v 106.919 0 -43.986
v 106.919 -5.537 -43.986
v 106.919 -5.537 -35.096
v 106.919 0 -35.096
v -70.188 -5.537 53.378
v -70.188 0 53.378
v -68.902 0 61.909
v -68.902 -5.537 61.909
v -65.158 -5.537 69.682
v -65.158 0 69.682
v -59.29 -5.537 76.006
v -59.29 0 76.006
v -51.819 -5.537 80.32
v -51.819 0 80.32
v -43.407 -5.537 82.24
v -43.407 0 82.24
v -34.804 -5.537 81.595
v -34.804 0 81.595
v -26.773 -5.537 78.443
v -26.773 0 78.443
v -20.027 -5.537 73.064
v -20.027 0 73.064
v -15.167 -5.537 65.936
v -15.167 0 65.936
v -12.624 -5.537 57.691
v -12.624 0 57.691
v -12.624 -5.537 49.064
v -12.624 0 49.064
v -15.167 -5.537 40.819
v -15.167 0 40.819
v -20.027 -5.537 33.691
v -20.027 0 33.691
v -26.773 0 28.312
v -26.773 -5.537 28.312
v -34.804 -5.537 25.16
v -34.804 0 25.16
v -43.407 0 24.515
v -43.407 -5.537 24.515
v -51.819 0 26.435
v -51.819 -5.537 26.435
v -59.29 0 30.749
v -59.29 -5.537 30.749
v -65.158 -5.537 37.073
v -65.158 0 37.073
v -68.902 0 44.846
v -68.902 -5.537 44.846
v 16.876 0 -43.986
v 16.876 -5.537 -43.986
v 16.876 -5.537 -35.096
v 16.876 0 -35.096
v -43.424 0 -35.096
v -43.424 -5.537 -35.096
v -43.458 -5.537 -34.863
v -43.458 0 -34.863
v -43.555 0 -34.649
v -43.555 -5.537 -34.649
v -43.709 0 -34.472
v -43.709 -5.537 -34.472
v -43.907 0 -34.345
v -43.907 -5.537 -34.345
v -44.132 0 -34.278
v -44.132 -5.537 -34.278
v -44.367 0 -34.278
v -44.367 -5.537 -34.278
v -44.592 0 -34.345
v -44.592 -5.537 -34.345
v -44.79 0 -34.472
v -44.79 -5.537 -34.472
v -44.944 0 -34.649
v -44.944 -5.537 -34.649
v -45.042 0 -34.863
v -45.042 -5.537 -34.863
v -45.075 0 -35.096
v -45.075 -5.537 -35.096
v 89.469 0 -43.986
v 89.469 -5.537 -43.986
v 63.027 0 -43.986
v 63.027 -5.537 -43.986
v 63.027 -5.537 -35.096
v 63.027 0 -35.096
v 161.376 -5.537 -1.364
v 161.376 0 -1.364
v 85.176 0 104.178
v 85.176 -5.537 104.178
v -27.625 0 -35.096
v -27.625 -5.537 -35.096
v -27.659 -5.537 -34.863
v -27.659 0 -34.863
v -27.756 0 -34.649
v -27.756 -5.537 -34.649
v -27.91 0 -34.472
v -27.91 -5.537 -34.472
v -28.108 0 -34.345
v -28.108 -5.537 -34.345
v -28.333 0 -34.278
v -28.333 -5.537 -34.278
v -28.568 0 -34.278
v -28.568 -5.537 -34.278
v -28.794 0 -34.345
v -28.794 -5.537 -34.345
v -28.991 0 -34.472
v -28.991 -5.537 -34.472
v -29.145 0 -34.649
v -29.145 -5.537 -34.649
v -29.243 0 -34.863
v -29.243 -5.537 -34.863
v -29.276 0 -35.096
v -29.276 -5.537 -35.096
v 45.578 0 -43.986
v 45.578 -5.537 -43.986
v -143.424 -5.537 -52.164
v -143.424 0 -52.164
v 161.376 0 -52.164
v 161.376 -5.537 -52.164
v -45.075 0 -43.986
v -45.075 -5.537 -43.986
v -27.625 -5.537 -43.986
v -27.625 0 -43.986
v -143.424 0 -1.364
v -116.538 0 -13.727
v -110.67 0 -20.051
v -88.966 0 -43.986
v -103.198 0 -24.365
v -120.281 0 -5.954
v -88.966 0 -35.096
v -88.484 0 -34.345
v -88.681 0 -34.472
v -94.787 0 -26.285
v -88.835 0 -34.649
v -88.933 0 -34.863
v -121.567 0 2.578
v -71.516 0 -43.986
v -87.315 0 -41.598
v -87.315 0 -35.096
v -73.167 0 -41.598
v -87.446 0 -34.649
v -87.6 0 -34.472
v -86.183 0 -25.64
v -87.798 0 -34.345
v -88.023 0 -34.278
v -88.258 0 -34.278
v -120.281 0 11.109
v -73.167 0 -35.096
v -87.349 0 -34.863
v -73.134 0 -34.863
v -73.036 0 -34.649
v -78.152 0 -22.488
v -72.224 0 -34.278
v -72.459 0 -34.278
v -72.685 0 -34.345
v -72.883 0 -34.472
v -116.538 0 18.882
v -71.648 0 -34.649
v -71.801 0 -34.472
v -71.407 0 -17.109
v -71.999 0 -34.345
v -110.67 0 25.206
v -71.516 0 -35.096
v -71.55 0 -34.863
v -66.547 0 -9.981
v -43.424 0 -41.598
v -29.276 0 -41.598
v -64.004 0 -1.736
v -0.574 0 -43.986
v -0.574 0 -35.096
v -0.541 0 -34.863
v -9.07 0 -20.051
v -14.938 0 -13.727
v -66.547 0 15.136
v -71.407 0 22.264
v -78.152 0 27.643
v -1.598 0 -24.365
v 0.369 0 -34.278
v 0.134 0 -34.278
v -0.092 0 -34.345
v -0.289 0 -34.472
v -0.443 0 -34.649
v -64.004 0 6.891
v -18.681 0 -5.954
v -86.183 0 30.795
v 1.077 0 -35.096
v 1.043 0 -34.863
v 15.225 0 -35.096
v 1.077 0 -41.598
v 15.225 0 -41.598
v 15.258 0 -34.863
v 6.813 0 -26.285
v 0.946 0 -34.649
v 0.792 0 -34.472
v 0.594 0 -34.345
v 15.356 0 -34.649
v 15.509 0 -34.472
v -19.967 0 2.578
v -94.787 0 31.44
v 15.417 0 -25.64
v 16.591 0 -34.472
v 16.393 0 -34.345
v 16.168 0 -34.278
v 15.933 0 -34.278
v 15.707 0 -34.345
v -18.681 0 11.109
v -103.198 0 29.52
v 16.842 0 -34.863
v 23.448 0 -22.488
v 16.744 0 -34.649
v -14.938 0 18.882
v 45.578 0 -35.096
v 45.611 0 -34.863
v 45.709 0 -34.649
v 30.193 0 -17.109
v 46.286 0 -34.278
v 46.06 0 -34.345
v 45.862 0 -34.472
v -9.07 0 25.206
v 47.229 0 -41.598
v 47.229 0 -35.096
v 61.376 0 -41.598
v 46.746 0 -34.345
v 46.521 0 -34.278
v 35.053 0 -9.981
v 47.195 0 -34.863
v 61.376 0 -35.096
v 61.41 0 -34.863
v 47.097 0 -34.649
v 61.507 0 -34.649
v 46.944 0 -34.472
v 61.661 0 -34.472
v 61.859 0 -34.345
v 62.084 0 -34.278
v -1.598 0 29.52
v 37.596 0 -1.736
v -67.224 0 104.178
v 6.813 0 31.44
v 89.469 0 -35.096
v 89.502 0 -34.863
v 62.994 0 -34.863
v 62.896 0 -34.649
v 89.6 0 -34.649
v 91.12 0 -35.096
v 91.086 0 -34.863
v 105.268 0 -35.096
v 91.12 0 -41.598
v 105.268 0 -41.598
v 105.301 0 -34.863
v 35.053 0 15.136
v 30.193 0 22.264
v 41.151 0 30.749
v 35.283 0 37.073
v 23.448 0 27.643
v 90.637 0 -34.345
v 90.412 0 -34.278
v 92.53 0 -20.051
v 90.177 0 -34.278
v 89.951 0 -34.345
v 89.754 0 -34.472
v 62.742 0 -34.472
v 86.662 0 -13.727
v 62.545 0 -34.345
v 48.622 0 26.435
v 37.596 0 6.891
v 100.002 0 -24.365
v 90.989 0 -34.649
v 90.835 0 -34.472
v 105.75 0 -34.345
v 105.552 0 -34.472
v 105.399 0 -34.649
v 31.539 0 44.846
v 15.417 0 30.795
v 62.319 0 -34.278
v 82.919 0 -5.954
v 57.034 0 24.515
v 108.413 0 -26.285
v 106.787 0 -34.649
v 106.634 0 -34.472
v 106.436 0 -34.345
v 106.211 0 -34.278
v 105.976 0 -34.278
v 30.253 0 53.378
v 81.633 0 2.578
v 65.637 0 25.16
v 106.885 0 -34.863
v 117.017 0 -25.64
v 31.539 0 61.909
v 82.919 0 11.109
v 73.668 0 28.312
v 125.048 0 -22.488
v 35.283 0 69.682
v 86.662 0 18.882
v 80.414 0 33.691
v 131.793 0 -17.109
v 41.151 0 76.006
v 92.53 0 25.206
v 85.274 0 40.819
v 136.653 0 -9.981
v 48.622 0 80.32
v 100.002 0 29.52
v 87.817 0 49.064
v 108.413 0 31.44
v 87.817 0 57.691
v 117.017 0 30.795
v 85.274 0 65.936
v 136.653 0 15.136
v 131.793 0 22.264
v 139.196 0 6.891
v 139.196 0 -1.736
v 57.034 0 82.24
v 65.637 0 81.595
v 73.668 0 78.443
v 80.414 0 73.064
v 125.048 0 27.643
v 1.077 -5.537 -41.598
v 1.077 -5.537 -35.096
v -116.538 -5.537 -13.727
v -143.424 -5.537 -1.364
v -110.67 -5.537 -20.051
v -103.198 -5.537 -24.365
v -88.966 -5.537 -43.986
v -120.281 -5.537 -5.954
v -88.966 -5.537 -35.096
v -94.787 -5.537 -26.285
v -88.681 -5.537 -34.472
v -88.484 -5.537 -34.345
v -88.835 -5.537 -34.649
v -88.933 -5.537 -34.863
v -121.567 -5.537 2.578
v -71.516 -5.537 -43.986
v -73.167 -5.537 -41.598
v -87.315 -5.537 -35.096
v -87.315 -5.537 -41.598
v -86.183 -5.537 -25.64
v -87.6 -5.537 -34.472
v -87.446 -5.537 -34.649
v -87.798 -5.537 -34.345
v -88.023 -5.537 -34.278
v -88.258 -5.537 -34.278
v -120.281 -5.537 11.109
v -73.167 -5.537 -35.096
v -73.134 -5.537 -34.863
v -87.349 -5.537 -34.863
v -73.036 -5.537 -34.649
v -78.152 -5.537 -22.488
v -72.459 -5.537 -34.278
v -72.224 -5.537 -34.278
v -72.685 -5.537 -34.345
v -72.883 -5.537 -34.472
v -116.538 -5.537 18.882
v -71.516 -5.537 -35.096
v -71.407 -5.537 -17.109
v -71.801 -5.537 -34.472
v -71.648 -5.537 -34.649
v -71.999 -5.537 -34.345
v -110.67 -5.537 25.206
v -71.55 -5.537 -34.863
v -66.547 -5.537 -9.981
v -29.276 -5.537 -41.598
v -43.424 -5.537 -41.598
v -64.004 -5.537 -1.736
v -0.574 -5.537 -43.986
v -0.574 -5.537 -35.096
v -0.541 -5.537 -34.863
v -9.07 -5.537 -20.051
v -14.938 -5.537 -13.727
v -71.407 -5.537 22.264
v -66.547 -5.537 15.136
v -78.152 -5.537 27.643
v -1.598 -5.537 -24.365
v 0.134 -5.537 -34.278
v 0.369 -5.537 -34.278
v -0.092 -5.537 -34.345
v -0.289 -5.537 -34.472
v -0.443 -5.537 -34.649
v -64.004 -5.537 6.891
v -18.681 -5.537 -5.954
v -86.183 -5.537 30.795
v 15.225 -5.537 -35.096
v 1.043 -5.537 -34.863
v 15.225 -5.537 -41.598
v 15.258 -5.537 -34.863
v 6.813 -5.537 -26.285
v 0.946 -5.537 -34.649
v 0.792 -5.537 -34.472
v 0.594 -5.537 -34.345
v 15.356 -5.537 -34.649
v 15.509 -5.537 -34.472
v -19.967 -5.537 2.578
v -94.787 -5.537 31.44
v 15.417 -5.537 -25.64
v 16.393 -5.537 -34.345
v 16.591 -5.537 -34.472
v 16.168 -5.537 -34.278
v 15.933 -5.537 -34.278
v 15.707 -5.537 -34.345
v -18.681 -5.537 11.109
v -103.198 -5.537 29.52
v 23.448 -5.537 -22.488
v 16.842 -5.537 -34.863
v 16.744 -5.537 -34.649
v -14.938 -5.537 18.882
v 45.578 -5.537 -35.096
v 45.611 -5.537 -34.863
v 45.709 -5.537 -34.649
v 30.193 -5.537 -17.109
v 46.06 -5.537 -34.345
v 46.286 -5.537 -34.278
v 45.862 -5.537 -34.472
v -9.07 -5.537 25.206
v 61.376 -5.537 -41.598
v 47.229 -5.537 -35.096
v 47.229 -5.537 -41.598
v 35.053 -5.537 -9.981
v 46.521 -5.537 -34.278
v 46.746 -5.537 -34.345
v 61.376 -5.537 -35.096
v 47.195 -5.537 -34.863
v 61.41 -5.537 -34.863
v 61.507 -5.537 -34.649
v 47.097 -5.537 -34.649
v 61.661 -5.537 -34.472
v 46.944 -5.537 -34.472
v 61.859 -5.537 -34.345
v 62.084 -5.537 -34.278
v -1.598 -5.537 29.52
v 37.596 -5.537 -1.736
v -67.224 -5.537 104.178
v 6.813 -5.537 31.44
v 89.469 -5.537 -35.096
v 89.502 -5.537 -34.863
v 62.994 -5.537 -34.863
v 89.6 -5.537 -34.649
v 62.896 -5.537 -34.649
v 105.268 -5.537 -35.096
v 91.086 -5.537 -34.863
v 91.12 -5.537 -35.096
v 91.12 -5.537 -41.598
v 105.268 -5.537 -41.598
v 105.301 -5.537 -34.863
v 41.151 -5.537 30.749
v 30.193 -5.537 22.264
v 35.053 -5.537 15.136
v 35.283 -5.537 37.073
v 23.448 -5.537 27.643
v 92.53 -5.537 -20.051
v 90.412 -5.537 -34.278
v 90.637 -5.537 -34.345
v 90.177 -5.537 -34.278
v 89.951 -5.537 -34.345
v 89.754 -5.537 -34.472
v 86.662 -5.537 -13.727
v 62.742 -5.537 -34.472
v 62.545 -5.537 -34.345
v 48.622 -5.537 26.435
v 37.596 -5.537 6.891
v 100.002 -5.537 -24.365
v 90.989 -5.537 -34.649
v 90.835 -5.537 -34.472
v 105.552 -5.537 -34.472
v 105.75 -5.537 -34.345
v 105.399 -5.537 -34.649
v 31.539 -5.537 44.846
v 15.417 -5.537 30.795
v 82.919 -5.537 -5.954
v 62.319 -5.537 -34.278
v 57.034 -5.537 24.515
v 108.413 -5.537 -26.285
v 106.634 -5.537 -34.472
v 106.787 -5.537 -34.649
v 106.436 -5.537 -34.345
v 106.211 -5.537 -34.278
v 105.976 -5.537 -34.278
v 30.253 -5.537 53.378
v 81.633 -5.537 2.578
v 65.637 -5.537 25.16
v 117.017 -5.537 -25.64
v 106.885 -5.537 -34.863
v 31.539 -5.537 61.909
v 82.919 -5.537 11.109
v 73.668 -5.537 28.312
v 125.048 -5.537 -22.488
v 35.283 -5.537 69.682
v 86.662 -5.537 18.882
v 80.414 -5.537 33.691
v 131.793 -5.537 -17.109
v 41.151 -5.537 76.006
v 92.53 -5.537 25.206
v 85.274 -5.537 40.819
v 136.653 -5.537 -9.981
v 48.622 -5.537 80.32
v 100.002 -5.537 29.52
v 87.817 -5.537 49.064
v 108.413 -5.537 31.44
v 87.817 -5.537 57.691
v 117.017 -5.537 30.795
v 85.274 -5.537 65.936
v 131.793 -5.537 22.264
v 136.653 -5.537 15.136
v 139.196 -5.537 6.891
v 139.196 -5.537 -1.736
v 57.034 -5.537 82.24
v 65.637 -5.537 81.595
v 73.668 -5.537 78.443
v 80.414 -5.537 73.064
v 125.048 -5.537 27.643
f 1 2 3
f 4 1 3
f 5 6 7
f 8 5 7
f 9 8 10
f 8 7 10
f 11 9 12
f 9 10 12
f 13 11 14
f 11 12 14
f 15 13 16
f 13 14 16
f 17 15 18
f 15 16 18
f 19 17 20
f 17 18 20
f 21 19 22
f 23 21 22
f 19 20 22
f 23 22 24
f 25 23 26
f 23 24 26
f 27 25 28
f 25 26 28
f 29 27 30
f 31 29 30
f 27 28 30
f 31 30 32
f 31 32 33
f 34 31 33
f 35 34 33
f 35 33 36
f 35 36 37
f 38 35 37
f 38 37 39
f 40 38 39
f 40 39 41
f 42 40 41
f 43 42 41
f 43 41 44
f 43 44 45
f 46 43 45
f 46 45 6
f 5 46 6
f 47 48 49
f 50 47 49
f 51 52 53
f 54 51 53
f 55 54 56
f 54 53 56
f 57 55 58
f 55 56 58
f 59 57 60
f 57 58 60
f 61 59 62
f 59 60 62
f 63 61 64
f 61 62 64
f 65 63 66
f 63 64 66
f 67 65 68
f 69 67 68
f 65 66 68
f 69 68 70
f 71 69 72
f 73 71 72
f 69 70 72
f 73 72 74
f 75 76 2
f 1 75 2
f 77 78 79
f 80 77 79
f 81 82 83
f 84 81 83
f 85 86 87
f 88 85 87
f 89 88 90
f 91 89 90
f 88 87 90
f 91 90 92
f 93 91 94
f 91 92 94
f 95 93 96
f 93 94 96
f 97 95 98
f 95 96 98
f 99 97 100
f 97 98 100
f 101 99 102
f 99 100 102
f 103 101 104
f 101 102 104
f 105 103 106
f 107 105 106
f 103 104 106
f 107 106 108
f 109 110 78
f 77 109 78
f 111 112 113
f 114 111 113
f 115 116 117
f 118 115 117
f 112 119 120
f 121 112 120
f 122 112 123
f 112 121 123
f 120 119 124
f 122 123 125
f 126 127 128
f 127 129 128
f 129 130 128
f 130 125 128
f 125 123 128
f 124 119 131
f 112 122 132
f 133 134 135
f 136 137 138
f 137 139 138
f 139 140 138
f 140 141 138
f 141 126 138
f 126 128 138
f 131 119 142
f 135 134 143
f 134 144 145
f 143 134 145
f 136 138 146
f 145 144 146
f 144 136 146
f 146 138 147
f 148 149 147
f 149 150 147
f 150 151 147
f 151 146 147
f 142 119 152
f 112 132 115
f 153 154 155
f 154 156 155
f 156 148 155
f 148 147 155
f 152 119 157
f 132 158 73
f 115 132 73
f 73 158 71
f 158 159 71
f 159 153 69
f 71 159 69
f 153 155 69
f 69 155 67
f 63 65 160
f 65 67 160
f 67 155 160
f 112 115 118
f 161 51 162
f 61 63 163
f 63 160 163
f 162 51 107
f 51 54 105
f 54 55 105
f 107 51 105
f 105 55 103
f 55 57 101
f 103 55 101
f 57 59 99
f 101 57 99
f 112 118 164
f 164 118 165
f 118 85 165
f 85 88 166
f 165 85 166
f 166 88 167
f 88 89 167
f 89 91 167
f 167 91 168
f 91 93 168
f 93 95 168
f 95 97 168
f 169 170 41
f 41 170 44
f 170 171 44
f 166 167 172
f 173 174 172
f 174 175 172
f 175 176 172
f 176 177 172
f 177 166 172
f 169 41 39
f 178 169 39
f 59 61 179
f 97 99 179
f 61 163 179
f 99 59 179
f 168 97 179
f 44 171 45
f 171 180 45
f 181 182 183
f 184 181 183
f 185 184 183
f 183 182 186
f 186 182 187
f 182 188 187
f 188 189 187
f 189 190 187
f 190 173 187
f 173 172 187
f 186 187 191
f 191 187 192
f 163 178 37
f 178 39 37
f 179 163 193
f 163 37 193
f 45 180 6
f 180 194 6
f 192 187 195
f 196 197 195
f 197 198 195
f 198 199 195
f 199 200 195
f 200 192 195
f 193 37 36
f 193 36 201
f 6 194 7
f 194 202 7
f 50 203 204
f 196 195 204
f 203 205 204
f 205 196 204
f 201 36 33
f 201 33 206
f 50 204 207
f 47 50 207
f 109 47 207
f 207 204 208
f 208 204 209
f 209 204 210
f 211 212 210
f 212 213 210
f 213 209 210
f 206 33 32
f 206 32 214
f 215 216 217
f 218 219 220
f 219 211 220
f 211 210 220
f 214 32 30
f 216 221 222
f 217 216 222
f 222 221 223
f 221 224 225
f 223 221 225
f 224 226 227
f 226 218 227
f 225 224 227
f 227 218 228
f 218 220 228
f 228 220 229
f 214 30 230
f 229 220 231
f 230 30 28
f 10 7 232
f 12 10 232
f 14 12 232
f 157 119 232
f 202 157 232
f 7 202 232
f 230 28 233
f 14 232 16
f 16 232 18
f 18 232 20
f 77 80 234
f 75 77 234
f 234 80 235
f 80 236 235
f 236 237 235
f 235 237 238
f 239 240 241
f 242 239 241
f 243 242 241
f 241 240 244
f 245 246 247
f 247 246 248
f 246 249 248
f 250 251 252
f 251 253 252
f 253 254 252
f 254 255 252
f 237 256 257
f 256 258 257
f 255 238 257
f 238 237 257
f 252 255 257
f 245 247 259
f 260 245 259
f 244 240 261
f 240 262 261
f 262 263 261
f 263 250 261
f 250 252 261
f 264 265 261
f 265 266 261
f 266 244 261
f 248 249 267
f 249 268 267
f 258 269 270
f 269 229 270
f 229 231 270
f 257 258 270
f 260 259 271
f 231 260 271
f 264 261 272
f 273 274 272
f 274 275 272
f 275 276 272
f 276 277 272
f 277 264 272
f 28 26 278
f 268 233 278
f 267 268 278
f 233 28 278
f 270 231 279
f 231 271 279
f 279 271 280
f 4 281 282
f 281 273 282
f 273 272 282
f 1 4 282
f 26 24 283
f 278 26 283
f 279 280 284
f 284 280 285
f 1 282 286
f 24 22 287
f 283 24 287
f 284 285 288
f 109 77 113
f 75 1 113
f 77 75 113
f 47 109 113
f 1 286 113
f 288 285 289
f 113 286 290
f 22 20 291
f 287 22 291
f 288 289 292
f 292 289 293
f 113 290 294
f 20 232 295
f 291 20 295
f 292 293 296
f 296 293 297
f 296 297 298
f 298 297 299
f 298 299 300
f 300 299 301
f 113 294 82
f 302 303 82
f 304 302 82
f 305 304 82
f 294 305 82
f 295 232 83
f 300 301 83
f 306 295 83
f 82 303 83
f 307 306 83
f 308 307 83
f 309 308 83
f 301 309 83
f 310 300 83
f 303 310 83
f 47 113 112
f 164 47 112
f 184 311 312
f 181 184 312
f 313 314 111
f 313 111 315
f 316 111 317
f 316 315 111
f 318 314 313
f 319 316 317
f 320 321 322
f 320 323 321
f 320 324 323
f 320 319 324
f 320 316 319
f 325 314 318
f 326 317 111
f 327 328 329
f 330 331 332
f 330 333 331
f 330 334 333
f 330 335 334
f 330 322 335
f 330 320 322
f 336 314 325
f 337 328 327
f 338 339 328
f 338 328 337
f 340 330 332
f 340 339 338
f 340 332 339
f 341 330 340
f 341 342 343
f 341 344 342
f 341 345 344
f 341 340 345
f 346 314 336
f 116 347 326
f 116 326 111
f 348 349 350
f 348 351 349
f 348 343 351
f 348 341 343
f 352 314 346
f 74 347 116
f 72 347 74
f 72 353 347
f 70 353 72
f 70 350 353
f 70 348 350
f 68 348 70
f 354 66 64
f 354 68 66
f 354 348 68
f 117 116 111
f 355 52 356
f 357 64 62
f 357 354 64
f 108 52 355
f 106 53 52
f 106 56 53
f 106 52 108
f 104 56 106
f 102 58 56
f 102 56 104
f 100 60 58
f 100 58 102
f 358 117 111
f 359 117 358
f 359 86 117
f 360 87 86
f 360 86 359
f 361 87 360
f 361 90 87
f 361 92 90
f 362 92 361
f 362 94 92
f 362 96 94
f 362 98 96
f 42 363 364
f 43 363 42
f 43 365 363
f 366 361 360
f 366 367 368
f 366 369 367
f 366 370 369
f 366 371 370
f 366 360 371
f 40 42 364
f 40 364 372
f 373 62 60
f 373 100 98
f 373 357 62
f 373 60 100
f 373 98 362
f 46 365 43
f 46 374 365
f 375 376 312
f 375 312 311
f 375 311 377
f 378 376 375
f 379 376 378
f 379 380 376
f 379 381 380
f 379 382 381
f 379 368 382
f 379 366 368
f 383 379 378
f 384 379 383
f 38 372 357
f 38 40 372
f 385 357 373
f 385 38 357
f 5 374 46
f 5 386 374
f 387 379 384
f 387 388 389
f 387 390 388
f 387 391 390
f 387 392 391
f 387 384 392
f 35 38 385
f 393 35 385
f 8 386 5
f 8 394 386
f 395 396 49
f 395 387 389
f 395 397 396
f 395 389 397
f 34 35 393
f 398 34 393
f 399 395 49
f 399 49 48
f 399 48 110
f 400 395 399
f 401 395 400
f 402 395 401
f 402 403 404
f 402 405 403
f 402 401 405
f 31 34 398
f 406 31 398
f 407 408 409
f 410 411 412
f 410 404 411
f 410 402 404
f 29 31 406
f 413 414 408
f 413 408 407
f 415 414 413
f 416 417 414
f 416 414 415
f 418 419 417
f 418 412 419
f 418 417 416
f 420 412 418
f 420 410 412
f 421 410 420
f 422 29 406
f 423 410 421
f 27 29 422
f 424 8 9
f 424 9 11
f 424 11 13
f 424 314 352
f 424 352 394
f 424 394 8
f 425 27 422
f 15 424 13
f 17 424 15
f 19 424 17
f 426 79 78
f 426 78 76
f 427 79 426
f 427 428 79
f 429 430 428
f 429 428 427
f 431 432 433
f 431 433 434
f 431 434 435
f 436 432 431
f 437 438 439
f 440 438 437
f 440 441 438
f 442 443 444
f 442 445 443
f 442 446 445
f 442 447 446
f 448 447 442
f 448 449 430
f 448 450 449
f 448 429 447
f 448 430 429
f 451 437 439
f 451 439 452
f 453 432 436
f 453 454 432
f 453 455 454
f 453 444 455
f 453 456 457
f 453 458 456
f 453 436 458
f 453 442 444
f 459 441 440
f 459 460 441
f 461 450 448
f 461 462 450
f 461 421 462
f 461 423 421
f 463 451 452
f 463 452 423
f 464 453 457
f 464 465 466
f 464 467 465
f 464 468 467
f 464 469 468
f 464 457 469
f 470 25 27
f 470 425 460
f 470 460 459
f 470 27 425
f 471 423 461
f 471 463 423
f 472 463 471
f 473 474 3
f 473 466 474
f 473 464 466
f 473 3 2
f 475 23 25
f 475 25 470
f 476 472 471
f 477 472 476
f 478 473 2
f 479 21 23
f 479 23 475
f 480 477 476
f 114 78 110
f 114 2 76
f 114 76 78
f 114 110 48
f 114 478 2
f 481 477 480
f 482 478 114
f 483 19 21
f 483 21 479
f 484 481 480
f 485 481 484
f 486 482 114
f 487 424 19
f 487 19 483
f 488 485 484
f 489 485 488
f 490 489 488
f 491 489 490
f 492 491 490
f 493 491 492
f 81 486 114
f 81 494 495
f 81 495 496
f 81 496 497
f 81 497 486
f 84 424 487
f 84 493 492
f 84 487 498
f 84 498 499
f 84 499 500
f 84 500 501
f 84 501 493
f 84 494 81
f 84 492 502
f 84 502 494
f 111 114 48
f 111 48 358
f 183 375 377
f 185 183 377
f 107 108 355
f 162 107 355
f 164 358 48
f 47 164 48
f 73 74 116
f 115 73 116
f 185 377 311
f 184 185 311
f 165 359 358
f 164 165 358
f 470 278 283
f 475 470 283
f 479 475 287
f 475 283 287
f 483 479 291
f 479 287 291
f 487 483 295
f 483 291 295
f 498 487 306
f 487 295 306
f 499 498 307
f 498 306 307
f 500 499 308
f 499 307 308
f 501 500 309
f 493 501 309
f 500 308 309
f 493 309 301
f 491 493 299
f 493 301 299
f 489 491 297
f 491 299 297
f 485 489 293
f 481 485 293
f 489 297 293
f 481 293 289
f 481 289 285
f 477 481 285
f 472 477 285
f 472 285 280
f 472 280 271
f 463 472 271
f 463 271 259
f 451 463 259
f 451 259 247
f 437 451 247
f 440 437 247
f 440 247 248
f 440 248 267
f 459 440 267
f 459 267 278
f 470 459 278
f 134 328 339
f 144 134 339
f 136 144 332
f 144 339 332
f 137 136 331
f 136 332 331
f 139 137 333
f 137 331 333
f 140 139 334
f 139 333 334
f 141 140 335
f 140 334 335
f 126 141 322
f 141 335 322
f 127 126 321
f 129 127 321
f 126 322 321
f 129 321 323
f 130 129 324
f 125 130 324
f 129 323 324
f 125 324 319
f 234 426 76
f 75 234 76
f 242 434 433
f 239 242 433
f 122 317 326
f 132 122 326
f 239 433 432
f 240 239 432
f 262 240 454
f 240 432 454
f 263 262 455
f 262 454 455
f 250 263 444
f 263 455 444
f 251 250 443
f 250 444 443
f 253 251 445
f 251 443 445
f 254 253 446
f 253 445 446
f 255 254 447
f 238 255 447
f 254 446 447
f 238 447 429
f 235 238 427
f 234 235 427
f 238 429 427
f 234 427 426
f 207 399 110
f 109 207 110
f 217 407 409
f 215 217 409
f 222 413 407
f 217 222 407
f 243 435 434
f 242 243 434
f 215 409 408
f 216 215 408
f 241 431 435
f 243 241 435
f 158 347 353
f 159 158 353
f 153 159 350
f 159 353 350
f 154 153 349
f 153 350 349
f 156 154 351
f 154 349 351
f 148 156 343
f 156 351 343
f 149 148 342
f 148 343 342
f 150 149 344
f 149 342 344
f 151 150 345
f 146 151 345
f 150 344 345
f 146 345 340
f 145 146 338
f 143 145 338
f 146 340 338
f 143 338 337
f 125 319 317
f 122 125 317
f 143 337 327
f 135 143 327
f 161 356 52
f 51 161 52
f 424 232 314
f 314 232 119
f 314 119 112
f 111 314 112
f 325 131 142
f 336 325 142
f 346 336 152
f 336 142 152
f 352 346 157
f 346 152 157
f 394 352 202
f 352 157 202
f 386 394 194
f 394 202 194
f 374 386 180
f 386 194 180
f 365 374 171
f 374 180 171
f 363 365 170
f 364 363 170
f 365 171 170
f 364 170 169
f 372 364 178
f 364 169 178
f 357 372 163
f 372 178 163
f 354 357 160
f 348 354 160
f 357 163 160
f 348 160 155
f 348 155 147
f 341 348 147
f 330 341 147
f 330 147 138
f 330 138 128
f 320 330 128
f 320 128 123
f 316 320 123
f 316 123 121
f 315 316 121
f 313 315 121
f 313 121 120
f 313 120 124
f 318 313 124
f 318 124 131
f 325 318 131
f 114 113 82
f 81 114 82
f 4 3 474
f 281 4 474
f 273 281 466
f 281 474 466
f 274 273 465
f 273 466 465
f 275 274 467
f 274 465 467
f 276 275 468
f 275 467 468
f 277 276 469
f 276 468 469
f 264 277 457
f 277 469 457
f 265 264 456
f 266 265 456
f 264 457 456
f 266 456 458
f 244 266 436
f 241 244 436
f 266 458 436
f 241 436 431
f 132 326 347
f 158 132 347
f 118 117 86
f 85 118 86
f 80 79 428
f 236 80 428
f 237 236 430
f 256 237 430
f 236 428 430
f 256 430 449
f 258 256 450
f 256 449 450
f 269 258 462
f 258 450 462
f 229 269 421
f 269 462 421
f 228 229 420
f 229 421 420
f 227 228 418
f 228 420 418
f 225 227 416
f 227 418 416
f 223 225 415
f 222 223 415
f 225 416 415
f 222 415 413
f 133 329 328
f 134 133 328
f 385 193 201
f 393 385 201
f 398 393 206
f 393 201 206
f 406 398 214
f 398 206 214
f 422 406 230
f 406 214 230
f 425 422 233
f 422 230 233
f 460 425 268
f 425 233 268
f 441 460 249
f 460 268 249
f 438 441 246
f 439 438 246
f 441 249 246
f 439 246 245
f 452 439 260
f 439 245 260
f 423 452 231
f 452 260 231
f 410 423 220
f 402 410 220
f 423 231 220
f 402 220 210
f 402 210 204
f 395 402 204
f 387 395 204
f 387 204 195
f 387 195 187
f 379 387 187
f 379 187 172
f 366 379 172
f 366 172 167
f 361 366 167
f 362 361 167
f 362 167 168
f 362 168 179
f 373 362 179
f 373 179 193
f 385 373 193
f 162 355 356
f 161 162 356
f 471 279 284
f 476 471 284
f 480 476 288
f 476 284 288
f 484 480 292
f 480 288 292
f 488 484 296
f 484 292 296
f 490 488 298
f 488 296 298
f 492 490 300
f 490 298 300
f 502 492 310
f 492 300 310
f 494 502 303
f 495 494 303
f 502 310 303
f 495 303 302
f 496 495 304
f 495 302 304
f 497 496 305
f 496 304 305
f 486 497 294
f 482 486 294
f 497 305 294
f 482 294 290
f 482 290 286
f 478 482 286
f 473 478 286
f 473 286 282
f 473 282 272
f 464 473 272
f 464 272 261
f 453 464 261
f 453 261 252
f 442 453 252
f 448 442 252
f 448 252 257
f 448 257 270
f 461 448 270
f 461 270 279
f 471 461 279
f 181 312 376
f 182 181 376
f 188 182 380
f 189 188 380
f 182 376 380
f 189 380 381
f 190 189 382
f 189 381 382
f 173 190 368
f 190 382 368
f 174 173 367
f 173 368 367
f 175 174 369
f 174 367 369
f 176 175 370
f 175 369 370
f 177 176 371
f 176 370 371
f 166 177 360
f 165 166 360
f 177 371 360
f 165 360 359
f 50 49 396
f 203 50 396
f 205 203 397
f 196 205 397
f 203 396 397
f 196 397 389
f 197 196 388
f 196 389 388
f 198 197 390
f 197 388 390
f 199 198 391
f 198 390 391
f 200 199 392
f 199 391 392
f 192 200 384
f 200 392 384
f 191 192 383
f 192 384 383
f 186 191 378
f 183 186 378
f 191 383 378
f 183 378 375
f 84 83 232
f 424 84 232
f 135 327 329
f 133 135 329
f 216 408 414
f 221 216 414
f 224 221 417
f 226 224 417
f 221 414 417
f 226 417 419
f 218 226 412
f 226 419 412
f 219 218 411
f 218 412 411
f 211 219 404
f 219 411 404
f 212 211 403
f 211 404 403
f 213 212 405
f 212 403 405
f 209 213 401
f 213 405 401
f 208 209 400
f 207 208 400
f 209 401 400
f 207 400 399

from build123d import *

# Parameters (mm, degrees)
F1_DEPTH  = 5.5372
F3_D      = 57.8866
F5_DEPTH  = 5.5382
F7_DEPTH  = 17.76331
F9_DEPTH  = 25.4
F11_DEPTH = 25.4
F13_DEPTH = 25.4


with BuildPart() as f1:
    # F0 (on Front) → F1 (new body)
    with BuildSketch(Plane.XZ):
        Polygon((85.176131, 104.177512), (-67.223869, 104.177512), (-143.423869, -1.364378), (-143.423869, -52.164378), (161.376131, -52.164378), (161.376131, -1.364378), align=None)
    extrude(amount=F1_DEPTH)

    # F3 (through all)
    with Locations(Plane.XZ.offset(5.5372)):
        with Locations((-41.244327, 53.377512), (59.196589, 53.377512), (110.576131, 2.577512), (8.976131, 2.577512), (-92.623869, 2.577512)):
            Hole(F3_D / 2)

    # F4 (on face) → F5 (cut, through all)
    with BuildSketch(Plane.XZ.offset(5.5372)):
        with BuildLine():
            ThreePointArc((-87.315269, -35.095578), (-88.140769, -34.270078), (-88.966269, -35.095578))
            Line((-88.966269, -35.095578), (-88.966269, -43.985578))
            Line((-88.966269, -43.985578), (-71.516469, -43.985578))
            Line((-71.516469, -43.985578), (-71.516469, -35.095578))
            ThreePointArc((-71.516469, -35.095578), (-72.341969, -34.270078), (-73.167469, -35.095578))
            Line((-73.167469, -35.095578), (-73.167469, -41.597978))
            Line((-73.167469, -41.597978), (-87.315269, -41.597978))
            Line((-87.315269, -41.597978), (-87.315269, -35.095578))
        make_face()
    extrude(amount=-F5_DEPTH, mode=Mode.SUBTRACT)

    # F6 (on face) → F7 (cut)
    with BuildSketch(Plane.XZ.offset(5.5372)):
        with BuildLine():
            ThreePointArc((-43.424069, -35.095578), (-44.249569, -34.270078), (-45.075069, -35.095578))
            Line((-45.075069, -35.095578), (-45.075069, -43.985578))
            Line((-45.075069, -43.985578), (-27.625269, -43.985578))
            Line((-27.625269, -43.985578), (-27.625269, -35.095578))
            ThreePointArc((-27.625269, -35.095578), (-28.450769, -34.270078), (-29.276269, -35.095578))
            Line((-29.276269, -35.095578), (-29.276269, -41.597978))
            Line((-29.276269, -41.597978), (-43.424069, -41.597978))
            Line((-43.424069, -41.597978), (-43.424069, -35.095578))
        make_face()
    extrude(amount=-F7_DEPTH, mode=Mode.SUBTRACT)

    # F8 (on face) → F9 (cut)
    with BuildSketch(Plane.XZ.offset(5.5372)):
        with BuildLine():
            ThreePointArc((1.076731, -35.095578), (0.251231, -34.270078), (-0.574269, -35.095578))
            Line((-0.574269, -35.095578), (-0.574269, -43.985578))
            Line((-0.574269, -43.985578), (16.875531, -43.985578))
            Line((16.875531, -43.985578), (16.875531, -35.095578))
            ThreePointArc((16.875531, -35.095578), (16.050031, -34.270078), (15.224531, -35.095578))
            Line((15.224531, -35.095578), (15.224531, -41.597978))
            Line((15.224531, -41.597978), (1.076731, -41.597978))
            Line((1.076731, -41.597978), (1.076731, -35.095578))
        make_face()
    extrude(amount=-F9_DEPTH, mode=Mode.SUBTRACT)

    # F10 (on face) → F11 (cut)
    with BuildSketch(Plane.XZ.offset(5.5372)):
        with BuildLine():
            ThreePointArc((47.228531, -35.095578), (46.403031, -34.270078), (45.577531, -35.095578))
            Line((45.577531, -35.095578), (45.577531, -43.985578))
            Line((45.577531, -43.985578), (63.027331, -43.985578))
            Line((63.027331, -43.985578), (63.027331, -35.095578))
            ThreePointArc((63.027331, -35.095578), (62.201831, -34.270078), (61.376331, -35.095578))
            Line((61.376331, -35.095578), (61.376331, -41.597978))
            Line((61.376331, -41.597978), (47.228531, -41.597978))
            Line((47.228531, -41.597978), (47.228531, -35.095578))
        make_face()
    extrude(amount=-F11_DEPTH, mode=Mode.SUBTRACT)

    # F12 (on face) → F13 (cut)
    with BuildSketch(Plane.XZ.offset(5.5372)):
        with BuildLine():
            ThreePointArc((91.119731, -35.095578), (90.294231, -34.270078), (89.468731, -35.095578))
            Line((89.468731, -35.095578), (89.468731, -43.985578))
            Line((89.468731, -43.985578), (106.918531, -43.985578))
            Line((106.918531, -43.985578), (106.918531, -35.095578))
            ThreePointArc((106.918531, -35.095578), (106.093031, -34.270078), (105.267531, -35.095578))
            Line((105.267531, -35.095578), (105.267531, -41.597978))
            Line((105.267531, -41.597978), (91.119731, -41.597978))
            Line((91.119731, -41.597978), (91.119731, -35.095578))
        make_face()
    extrude(amount=-F13_DEPTH, mode=Mode.SUBTRACT)


solid = f1.part
